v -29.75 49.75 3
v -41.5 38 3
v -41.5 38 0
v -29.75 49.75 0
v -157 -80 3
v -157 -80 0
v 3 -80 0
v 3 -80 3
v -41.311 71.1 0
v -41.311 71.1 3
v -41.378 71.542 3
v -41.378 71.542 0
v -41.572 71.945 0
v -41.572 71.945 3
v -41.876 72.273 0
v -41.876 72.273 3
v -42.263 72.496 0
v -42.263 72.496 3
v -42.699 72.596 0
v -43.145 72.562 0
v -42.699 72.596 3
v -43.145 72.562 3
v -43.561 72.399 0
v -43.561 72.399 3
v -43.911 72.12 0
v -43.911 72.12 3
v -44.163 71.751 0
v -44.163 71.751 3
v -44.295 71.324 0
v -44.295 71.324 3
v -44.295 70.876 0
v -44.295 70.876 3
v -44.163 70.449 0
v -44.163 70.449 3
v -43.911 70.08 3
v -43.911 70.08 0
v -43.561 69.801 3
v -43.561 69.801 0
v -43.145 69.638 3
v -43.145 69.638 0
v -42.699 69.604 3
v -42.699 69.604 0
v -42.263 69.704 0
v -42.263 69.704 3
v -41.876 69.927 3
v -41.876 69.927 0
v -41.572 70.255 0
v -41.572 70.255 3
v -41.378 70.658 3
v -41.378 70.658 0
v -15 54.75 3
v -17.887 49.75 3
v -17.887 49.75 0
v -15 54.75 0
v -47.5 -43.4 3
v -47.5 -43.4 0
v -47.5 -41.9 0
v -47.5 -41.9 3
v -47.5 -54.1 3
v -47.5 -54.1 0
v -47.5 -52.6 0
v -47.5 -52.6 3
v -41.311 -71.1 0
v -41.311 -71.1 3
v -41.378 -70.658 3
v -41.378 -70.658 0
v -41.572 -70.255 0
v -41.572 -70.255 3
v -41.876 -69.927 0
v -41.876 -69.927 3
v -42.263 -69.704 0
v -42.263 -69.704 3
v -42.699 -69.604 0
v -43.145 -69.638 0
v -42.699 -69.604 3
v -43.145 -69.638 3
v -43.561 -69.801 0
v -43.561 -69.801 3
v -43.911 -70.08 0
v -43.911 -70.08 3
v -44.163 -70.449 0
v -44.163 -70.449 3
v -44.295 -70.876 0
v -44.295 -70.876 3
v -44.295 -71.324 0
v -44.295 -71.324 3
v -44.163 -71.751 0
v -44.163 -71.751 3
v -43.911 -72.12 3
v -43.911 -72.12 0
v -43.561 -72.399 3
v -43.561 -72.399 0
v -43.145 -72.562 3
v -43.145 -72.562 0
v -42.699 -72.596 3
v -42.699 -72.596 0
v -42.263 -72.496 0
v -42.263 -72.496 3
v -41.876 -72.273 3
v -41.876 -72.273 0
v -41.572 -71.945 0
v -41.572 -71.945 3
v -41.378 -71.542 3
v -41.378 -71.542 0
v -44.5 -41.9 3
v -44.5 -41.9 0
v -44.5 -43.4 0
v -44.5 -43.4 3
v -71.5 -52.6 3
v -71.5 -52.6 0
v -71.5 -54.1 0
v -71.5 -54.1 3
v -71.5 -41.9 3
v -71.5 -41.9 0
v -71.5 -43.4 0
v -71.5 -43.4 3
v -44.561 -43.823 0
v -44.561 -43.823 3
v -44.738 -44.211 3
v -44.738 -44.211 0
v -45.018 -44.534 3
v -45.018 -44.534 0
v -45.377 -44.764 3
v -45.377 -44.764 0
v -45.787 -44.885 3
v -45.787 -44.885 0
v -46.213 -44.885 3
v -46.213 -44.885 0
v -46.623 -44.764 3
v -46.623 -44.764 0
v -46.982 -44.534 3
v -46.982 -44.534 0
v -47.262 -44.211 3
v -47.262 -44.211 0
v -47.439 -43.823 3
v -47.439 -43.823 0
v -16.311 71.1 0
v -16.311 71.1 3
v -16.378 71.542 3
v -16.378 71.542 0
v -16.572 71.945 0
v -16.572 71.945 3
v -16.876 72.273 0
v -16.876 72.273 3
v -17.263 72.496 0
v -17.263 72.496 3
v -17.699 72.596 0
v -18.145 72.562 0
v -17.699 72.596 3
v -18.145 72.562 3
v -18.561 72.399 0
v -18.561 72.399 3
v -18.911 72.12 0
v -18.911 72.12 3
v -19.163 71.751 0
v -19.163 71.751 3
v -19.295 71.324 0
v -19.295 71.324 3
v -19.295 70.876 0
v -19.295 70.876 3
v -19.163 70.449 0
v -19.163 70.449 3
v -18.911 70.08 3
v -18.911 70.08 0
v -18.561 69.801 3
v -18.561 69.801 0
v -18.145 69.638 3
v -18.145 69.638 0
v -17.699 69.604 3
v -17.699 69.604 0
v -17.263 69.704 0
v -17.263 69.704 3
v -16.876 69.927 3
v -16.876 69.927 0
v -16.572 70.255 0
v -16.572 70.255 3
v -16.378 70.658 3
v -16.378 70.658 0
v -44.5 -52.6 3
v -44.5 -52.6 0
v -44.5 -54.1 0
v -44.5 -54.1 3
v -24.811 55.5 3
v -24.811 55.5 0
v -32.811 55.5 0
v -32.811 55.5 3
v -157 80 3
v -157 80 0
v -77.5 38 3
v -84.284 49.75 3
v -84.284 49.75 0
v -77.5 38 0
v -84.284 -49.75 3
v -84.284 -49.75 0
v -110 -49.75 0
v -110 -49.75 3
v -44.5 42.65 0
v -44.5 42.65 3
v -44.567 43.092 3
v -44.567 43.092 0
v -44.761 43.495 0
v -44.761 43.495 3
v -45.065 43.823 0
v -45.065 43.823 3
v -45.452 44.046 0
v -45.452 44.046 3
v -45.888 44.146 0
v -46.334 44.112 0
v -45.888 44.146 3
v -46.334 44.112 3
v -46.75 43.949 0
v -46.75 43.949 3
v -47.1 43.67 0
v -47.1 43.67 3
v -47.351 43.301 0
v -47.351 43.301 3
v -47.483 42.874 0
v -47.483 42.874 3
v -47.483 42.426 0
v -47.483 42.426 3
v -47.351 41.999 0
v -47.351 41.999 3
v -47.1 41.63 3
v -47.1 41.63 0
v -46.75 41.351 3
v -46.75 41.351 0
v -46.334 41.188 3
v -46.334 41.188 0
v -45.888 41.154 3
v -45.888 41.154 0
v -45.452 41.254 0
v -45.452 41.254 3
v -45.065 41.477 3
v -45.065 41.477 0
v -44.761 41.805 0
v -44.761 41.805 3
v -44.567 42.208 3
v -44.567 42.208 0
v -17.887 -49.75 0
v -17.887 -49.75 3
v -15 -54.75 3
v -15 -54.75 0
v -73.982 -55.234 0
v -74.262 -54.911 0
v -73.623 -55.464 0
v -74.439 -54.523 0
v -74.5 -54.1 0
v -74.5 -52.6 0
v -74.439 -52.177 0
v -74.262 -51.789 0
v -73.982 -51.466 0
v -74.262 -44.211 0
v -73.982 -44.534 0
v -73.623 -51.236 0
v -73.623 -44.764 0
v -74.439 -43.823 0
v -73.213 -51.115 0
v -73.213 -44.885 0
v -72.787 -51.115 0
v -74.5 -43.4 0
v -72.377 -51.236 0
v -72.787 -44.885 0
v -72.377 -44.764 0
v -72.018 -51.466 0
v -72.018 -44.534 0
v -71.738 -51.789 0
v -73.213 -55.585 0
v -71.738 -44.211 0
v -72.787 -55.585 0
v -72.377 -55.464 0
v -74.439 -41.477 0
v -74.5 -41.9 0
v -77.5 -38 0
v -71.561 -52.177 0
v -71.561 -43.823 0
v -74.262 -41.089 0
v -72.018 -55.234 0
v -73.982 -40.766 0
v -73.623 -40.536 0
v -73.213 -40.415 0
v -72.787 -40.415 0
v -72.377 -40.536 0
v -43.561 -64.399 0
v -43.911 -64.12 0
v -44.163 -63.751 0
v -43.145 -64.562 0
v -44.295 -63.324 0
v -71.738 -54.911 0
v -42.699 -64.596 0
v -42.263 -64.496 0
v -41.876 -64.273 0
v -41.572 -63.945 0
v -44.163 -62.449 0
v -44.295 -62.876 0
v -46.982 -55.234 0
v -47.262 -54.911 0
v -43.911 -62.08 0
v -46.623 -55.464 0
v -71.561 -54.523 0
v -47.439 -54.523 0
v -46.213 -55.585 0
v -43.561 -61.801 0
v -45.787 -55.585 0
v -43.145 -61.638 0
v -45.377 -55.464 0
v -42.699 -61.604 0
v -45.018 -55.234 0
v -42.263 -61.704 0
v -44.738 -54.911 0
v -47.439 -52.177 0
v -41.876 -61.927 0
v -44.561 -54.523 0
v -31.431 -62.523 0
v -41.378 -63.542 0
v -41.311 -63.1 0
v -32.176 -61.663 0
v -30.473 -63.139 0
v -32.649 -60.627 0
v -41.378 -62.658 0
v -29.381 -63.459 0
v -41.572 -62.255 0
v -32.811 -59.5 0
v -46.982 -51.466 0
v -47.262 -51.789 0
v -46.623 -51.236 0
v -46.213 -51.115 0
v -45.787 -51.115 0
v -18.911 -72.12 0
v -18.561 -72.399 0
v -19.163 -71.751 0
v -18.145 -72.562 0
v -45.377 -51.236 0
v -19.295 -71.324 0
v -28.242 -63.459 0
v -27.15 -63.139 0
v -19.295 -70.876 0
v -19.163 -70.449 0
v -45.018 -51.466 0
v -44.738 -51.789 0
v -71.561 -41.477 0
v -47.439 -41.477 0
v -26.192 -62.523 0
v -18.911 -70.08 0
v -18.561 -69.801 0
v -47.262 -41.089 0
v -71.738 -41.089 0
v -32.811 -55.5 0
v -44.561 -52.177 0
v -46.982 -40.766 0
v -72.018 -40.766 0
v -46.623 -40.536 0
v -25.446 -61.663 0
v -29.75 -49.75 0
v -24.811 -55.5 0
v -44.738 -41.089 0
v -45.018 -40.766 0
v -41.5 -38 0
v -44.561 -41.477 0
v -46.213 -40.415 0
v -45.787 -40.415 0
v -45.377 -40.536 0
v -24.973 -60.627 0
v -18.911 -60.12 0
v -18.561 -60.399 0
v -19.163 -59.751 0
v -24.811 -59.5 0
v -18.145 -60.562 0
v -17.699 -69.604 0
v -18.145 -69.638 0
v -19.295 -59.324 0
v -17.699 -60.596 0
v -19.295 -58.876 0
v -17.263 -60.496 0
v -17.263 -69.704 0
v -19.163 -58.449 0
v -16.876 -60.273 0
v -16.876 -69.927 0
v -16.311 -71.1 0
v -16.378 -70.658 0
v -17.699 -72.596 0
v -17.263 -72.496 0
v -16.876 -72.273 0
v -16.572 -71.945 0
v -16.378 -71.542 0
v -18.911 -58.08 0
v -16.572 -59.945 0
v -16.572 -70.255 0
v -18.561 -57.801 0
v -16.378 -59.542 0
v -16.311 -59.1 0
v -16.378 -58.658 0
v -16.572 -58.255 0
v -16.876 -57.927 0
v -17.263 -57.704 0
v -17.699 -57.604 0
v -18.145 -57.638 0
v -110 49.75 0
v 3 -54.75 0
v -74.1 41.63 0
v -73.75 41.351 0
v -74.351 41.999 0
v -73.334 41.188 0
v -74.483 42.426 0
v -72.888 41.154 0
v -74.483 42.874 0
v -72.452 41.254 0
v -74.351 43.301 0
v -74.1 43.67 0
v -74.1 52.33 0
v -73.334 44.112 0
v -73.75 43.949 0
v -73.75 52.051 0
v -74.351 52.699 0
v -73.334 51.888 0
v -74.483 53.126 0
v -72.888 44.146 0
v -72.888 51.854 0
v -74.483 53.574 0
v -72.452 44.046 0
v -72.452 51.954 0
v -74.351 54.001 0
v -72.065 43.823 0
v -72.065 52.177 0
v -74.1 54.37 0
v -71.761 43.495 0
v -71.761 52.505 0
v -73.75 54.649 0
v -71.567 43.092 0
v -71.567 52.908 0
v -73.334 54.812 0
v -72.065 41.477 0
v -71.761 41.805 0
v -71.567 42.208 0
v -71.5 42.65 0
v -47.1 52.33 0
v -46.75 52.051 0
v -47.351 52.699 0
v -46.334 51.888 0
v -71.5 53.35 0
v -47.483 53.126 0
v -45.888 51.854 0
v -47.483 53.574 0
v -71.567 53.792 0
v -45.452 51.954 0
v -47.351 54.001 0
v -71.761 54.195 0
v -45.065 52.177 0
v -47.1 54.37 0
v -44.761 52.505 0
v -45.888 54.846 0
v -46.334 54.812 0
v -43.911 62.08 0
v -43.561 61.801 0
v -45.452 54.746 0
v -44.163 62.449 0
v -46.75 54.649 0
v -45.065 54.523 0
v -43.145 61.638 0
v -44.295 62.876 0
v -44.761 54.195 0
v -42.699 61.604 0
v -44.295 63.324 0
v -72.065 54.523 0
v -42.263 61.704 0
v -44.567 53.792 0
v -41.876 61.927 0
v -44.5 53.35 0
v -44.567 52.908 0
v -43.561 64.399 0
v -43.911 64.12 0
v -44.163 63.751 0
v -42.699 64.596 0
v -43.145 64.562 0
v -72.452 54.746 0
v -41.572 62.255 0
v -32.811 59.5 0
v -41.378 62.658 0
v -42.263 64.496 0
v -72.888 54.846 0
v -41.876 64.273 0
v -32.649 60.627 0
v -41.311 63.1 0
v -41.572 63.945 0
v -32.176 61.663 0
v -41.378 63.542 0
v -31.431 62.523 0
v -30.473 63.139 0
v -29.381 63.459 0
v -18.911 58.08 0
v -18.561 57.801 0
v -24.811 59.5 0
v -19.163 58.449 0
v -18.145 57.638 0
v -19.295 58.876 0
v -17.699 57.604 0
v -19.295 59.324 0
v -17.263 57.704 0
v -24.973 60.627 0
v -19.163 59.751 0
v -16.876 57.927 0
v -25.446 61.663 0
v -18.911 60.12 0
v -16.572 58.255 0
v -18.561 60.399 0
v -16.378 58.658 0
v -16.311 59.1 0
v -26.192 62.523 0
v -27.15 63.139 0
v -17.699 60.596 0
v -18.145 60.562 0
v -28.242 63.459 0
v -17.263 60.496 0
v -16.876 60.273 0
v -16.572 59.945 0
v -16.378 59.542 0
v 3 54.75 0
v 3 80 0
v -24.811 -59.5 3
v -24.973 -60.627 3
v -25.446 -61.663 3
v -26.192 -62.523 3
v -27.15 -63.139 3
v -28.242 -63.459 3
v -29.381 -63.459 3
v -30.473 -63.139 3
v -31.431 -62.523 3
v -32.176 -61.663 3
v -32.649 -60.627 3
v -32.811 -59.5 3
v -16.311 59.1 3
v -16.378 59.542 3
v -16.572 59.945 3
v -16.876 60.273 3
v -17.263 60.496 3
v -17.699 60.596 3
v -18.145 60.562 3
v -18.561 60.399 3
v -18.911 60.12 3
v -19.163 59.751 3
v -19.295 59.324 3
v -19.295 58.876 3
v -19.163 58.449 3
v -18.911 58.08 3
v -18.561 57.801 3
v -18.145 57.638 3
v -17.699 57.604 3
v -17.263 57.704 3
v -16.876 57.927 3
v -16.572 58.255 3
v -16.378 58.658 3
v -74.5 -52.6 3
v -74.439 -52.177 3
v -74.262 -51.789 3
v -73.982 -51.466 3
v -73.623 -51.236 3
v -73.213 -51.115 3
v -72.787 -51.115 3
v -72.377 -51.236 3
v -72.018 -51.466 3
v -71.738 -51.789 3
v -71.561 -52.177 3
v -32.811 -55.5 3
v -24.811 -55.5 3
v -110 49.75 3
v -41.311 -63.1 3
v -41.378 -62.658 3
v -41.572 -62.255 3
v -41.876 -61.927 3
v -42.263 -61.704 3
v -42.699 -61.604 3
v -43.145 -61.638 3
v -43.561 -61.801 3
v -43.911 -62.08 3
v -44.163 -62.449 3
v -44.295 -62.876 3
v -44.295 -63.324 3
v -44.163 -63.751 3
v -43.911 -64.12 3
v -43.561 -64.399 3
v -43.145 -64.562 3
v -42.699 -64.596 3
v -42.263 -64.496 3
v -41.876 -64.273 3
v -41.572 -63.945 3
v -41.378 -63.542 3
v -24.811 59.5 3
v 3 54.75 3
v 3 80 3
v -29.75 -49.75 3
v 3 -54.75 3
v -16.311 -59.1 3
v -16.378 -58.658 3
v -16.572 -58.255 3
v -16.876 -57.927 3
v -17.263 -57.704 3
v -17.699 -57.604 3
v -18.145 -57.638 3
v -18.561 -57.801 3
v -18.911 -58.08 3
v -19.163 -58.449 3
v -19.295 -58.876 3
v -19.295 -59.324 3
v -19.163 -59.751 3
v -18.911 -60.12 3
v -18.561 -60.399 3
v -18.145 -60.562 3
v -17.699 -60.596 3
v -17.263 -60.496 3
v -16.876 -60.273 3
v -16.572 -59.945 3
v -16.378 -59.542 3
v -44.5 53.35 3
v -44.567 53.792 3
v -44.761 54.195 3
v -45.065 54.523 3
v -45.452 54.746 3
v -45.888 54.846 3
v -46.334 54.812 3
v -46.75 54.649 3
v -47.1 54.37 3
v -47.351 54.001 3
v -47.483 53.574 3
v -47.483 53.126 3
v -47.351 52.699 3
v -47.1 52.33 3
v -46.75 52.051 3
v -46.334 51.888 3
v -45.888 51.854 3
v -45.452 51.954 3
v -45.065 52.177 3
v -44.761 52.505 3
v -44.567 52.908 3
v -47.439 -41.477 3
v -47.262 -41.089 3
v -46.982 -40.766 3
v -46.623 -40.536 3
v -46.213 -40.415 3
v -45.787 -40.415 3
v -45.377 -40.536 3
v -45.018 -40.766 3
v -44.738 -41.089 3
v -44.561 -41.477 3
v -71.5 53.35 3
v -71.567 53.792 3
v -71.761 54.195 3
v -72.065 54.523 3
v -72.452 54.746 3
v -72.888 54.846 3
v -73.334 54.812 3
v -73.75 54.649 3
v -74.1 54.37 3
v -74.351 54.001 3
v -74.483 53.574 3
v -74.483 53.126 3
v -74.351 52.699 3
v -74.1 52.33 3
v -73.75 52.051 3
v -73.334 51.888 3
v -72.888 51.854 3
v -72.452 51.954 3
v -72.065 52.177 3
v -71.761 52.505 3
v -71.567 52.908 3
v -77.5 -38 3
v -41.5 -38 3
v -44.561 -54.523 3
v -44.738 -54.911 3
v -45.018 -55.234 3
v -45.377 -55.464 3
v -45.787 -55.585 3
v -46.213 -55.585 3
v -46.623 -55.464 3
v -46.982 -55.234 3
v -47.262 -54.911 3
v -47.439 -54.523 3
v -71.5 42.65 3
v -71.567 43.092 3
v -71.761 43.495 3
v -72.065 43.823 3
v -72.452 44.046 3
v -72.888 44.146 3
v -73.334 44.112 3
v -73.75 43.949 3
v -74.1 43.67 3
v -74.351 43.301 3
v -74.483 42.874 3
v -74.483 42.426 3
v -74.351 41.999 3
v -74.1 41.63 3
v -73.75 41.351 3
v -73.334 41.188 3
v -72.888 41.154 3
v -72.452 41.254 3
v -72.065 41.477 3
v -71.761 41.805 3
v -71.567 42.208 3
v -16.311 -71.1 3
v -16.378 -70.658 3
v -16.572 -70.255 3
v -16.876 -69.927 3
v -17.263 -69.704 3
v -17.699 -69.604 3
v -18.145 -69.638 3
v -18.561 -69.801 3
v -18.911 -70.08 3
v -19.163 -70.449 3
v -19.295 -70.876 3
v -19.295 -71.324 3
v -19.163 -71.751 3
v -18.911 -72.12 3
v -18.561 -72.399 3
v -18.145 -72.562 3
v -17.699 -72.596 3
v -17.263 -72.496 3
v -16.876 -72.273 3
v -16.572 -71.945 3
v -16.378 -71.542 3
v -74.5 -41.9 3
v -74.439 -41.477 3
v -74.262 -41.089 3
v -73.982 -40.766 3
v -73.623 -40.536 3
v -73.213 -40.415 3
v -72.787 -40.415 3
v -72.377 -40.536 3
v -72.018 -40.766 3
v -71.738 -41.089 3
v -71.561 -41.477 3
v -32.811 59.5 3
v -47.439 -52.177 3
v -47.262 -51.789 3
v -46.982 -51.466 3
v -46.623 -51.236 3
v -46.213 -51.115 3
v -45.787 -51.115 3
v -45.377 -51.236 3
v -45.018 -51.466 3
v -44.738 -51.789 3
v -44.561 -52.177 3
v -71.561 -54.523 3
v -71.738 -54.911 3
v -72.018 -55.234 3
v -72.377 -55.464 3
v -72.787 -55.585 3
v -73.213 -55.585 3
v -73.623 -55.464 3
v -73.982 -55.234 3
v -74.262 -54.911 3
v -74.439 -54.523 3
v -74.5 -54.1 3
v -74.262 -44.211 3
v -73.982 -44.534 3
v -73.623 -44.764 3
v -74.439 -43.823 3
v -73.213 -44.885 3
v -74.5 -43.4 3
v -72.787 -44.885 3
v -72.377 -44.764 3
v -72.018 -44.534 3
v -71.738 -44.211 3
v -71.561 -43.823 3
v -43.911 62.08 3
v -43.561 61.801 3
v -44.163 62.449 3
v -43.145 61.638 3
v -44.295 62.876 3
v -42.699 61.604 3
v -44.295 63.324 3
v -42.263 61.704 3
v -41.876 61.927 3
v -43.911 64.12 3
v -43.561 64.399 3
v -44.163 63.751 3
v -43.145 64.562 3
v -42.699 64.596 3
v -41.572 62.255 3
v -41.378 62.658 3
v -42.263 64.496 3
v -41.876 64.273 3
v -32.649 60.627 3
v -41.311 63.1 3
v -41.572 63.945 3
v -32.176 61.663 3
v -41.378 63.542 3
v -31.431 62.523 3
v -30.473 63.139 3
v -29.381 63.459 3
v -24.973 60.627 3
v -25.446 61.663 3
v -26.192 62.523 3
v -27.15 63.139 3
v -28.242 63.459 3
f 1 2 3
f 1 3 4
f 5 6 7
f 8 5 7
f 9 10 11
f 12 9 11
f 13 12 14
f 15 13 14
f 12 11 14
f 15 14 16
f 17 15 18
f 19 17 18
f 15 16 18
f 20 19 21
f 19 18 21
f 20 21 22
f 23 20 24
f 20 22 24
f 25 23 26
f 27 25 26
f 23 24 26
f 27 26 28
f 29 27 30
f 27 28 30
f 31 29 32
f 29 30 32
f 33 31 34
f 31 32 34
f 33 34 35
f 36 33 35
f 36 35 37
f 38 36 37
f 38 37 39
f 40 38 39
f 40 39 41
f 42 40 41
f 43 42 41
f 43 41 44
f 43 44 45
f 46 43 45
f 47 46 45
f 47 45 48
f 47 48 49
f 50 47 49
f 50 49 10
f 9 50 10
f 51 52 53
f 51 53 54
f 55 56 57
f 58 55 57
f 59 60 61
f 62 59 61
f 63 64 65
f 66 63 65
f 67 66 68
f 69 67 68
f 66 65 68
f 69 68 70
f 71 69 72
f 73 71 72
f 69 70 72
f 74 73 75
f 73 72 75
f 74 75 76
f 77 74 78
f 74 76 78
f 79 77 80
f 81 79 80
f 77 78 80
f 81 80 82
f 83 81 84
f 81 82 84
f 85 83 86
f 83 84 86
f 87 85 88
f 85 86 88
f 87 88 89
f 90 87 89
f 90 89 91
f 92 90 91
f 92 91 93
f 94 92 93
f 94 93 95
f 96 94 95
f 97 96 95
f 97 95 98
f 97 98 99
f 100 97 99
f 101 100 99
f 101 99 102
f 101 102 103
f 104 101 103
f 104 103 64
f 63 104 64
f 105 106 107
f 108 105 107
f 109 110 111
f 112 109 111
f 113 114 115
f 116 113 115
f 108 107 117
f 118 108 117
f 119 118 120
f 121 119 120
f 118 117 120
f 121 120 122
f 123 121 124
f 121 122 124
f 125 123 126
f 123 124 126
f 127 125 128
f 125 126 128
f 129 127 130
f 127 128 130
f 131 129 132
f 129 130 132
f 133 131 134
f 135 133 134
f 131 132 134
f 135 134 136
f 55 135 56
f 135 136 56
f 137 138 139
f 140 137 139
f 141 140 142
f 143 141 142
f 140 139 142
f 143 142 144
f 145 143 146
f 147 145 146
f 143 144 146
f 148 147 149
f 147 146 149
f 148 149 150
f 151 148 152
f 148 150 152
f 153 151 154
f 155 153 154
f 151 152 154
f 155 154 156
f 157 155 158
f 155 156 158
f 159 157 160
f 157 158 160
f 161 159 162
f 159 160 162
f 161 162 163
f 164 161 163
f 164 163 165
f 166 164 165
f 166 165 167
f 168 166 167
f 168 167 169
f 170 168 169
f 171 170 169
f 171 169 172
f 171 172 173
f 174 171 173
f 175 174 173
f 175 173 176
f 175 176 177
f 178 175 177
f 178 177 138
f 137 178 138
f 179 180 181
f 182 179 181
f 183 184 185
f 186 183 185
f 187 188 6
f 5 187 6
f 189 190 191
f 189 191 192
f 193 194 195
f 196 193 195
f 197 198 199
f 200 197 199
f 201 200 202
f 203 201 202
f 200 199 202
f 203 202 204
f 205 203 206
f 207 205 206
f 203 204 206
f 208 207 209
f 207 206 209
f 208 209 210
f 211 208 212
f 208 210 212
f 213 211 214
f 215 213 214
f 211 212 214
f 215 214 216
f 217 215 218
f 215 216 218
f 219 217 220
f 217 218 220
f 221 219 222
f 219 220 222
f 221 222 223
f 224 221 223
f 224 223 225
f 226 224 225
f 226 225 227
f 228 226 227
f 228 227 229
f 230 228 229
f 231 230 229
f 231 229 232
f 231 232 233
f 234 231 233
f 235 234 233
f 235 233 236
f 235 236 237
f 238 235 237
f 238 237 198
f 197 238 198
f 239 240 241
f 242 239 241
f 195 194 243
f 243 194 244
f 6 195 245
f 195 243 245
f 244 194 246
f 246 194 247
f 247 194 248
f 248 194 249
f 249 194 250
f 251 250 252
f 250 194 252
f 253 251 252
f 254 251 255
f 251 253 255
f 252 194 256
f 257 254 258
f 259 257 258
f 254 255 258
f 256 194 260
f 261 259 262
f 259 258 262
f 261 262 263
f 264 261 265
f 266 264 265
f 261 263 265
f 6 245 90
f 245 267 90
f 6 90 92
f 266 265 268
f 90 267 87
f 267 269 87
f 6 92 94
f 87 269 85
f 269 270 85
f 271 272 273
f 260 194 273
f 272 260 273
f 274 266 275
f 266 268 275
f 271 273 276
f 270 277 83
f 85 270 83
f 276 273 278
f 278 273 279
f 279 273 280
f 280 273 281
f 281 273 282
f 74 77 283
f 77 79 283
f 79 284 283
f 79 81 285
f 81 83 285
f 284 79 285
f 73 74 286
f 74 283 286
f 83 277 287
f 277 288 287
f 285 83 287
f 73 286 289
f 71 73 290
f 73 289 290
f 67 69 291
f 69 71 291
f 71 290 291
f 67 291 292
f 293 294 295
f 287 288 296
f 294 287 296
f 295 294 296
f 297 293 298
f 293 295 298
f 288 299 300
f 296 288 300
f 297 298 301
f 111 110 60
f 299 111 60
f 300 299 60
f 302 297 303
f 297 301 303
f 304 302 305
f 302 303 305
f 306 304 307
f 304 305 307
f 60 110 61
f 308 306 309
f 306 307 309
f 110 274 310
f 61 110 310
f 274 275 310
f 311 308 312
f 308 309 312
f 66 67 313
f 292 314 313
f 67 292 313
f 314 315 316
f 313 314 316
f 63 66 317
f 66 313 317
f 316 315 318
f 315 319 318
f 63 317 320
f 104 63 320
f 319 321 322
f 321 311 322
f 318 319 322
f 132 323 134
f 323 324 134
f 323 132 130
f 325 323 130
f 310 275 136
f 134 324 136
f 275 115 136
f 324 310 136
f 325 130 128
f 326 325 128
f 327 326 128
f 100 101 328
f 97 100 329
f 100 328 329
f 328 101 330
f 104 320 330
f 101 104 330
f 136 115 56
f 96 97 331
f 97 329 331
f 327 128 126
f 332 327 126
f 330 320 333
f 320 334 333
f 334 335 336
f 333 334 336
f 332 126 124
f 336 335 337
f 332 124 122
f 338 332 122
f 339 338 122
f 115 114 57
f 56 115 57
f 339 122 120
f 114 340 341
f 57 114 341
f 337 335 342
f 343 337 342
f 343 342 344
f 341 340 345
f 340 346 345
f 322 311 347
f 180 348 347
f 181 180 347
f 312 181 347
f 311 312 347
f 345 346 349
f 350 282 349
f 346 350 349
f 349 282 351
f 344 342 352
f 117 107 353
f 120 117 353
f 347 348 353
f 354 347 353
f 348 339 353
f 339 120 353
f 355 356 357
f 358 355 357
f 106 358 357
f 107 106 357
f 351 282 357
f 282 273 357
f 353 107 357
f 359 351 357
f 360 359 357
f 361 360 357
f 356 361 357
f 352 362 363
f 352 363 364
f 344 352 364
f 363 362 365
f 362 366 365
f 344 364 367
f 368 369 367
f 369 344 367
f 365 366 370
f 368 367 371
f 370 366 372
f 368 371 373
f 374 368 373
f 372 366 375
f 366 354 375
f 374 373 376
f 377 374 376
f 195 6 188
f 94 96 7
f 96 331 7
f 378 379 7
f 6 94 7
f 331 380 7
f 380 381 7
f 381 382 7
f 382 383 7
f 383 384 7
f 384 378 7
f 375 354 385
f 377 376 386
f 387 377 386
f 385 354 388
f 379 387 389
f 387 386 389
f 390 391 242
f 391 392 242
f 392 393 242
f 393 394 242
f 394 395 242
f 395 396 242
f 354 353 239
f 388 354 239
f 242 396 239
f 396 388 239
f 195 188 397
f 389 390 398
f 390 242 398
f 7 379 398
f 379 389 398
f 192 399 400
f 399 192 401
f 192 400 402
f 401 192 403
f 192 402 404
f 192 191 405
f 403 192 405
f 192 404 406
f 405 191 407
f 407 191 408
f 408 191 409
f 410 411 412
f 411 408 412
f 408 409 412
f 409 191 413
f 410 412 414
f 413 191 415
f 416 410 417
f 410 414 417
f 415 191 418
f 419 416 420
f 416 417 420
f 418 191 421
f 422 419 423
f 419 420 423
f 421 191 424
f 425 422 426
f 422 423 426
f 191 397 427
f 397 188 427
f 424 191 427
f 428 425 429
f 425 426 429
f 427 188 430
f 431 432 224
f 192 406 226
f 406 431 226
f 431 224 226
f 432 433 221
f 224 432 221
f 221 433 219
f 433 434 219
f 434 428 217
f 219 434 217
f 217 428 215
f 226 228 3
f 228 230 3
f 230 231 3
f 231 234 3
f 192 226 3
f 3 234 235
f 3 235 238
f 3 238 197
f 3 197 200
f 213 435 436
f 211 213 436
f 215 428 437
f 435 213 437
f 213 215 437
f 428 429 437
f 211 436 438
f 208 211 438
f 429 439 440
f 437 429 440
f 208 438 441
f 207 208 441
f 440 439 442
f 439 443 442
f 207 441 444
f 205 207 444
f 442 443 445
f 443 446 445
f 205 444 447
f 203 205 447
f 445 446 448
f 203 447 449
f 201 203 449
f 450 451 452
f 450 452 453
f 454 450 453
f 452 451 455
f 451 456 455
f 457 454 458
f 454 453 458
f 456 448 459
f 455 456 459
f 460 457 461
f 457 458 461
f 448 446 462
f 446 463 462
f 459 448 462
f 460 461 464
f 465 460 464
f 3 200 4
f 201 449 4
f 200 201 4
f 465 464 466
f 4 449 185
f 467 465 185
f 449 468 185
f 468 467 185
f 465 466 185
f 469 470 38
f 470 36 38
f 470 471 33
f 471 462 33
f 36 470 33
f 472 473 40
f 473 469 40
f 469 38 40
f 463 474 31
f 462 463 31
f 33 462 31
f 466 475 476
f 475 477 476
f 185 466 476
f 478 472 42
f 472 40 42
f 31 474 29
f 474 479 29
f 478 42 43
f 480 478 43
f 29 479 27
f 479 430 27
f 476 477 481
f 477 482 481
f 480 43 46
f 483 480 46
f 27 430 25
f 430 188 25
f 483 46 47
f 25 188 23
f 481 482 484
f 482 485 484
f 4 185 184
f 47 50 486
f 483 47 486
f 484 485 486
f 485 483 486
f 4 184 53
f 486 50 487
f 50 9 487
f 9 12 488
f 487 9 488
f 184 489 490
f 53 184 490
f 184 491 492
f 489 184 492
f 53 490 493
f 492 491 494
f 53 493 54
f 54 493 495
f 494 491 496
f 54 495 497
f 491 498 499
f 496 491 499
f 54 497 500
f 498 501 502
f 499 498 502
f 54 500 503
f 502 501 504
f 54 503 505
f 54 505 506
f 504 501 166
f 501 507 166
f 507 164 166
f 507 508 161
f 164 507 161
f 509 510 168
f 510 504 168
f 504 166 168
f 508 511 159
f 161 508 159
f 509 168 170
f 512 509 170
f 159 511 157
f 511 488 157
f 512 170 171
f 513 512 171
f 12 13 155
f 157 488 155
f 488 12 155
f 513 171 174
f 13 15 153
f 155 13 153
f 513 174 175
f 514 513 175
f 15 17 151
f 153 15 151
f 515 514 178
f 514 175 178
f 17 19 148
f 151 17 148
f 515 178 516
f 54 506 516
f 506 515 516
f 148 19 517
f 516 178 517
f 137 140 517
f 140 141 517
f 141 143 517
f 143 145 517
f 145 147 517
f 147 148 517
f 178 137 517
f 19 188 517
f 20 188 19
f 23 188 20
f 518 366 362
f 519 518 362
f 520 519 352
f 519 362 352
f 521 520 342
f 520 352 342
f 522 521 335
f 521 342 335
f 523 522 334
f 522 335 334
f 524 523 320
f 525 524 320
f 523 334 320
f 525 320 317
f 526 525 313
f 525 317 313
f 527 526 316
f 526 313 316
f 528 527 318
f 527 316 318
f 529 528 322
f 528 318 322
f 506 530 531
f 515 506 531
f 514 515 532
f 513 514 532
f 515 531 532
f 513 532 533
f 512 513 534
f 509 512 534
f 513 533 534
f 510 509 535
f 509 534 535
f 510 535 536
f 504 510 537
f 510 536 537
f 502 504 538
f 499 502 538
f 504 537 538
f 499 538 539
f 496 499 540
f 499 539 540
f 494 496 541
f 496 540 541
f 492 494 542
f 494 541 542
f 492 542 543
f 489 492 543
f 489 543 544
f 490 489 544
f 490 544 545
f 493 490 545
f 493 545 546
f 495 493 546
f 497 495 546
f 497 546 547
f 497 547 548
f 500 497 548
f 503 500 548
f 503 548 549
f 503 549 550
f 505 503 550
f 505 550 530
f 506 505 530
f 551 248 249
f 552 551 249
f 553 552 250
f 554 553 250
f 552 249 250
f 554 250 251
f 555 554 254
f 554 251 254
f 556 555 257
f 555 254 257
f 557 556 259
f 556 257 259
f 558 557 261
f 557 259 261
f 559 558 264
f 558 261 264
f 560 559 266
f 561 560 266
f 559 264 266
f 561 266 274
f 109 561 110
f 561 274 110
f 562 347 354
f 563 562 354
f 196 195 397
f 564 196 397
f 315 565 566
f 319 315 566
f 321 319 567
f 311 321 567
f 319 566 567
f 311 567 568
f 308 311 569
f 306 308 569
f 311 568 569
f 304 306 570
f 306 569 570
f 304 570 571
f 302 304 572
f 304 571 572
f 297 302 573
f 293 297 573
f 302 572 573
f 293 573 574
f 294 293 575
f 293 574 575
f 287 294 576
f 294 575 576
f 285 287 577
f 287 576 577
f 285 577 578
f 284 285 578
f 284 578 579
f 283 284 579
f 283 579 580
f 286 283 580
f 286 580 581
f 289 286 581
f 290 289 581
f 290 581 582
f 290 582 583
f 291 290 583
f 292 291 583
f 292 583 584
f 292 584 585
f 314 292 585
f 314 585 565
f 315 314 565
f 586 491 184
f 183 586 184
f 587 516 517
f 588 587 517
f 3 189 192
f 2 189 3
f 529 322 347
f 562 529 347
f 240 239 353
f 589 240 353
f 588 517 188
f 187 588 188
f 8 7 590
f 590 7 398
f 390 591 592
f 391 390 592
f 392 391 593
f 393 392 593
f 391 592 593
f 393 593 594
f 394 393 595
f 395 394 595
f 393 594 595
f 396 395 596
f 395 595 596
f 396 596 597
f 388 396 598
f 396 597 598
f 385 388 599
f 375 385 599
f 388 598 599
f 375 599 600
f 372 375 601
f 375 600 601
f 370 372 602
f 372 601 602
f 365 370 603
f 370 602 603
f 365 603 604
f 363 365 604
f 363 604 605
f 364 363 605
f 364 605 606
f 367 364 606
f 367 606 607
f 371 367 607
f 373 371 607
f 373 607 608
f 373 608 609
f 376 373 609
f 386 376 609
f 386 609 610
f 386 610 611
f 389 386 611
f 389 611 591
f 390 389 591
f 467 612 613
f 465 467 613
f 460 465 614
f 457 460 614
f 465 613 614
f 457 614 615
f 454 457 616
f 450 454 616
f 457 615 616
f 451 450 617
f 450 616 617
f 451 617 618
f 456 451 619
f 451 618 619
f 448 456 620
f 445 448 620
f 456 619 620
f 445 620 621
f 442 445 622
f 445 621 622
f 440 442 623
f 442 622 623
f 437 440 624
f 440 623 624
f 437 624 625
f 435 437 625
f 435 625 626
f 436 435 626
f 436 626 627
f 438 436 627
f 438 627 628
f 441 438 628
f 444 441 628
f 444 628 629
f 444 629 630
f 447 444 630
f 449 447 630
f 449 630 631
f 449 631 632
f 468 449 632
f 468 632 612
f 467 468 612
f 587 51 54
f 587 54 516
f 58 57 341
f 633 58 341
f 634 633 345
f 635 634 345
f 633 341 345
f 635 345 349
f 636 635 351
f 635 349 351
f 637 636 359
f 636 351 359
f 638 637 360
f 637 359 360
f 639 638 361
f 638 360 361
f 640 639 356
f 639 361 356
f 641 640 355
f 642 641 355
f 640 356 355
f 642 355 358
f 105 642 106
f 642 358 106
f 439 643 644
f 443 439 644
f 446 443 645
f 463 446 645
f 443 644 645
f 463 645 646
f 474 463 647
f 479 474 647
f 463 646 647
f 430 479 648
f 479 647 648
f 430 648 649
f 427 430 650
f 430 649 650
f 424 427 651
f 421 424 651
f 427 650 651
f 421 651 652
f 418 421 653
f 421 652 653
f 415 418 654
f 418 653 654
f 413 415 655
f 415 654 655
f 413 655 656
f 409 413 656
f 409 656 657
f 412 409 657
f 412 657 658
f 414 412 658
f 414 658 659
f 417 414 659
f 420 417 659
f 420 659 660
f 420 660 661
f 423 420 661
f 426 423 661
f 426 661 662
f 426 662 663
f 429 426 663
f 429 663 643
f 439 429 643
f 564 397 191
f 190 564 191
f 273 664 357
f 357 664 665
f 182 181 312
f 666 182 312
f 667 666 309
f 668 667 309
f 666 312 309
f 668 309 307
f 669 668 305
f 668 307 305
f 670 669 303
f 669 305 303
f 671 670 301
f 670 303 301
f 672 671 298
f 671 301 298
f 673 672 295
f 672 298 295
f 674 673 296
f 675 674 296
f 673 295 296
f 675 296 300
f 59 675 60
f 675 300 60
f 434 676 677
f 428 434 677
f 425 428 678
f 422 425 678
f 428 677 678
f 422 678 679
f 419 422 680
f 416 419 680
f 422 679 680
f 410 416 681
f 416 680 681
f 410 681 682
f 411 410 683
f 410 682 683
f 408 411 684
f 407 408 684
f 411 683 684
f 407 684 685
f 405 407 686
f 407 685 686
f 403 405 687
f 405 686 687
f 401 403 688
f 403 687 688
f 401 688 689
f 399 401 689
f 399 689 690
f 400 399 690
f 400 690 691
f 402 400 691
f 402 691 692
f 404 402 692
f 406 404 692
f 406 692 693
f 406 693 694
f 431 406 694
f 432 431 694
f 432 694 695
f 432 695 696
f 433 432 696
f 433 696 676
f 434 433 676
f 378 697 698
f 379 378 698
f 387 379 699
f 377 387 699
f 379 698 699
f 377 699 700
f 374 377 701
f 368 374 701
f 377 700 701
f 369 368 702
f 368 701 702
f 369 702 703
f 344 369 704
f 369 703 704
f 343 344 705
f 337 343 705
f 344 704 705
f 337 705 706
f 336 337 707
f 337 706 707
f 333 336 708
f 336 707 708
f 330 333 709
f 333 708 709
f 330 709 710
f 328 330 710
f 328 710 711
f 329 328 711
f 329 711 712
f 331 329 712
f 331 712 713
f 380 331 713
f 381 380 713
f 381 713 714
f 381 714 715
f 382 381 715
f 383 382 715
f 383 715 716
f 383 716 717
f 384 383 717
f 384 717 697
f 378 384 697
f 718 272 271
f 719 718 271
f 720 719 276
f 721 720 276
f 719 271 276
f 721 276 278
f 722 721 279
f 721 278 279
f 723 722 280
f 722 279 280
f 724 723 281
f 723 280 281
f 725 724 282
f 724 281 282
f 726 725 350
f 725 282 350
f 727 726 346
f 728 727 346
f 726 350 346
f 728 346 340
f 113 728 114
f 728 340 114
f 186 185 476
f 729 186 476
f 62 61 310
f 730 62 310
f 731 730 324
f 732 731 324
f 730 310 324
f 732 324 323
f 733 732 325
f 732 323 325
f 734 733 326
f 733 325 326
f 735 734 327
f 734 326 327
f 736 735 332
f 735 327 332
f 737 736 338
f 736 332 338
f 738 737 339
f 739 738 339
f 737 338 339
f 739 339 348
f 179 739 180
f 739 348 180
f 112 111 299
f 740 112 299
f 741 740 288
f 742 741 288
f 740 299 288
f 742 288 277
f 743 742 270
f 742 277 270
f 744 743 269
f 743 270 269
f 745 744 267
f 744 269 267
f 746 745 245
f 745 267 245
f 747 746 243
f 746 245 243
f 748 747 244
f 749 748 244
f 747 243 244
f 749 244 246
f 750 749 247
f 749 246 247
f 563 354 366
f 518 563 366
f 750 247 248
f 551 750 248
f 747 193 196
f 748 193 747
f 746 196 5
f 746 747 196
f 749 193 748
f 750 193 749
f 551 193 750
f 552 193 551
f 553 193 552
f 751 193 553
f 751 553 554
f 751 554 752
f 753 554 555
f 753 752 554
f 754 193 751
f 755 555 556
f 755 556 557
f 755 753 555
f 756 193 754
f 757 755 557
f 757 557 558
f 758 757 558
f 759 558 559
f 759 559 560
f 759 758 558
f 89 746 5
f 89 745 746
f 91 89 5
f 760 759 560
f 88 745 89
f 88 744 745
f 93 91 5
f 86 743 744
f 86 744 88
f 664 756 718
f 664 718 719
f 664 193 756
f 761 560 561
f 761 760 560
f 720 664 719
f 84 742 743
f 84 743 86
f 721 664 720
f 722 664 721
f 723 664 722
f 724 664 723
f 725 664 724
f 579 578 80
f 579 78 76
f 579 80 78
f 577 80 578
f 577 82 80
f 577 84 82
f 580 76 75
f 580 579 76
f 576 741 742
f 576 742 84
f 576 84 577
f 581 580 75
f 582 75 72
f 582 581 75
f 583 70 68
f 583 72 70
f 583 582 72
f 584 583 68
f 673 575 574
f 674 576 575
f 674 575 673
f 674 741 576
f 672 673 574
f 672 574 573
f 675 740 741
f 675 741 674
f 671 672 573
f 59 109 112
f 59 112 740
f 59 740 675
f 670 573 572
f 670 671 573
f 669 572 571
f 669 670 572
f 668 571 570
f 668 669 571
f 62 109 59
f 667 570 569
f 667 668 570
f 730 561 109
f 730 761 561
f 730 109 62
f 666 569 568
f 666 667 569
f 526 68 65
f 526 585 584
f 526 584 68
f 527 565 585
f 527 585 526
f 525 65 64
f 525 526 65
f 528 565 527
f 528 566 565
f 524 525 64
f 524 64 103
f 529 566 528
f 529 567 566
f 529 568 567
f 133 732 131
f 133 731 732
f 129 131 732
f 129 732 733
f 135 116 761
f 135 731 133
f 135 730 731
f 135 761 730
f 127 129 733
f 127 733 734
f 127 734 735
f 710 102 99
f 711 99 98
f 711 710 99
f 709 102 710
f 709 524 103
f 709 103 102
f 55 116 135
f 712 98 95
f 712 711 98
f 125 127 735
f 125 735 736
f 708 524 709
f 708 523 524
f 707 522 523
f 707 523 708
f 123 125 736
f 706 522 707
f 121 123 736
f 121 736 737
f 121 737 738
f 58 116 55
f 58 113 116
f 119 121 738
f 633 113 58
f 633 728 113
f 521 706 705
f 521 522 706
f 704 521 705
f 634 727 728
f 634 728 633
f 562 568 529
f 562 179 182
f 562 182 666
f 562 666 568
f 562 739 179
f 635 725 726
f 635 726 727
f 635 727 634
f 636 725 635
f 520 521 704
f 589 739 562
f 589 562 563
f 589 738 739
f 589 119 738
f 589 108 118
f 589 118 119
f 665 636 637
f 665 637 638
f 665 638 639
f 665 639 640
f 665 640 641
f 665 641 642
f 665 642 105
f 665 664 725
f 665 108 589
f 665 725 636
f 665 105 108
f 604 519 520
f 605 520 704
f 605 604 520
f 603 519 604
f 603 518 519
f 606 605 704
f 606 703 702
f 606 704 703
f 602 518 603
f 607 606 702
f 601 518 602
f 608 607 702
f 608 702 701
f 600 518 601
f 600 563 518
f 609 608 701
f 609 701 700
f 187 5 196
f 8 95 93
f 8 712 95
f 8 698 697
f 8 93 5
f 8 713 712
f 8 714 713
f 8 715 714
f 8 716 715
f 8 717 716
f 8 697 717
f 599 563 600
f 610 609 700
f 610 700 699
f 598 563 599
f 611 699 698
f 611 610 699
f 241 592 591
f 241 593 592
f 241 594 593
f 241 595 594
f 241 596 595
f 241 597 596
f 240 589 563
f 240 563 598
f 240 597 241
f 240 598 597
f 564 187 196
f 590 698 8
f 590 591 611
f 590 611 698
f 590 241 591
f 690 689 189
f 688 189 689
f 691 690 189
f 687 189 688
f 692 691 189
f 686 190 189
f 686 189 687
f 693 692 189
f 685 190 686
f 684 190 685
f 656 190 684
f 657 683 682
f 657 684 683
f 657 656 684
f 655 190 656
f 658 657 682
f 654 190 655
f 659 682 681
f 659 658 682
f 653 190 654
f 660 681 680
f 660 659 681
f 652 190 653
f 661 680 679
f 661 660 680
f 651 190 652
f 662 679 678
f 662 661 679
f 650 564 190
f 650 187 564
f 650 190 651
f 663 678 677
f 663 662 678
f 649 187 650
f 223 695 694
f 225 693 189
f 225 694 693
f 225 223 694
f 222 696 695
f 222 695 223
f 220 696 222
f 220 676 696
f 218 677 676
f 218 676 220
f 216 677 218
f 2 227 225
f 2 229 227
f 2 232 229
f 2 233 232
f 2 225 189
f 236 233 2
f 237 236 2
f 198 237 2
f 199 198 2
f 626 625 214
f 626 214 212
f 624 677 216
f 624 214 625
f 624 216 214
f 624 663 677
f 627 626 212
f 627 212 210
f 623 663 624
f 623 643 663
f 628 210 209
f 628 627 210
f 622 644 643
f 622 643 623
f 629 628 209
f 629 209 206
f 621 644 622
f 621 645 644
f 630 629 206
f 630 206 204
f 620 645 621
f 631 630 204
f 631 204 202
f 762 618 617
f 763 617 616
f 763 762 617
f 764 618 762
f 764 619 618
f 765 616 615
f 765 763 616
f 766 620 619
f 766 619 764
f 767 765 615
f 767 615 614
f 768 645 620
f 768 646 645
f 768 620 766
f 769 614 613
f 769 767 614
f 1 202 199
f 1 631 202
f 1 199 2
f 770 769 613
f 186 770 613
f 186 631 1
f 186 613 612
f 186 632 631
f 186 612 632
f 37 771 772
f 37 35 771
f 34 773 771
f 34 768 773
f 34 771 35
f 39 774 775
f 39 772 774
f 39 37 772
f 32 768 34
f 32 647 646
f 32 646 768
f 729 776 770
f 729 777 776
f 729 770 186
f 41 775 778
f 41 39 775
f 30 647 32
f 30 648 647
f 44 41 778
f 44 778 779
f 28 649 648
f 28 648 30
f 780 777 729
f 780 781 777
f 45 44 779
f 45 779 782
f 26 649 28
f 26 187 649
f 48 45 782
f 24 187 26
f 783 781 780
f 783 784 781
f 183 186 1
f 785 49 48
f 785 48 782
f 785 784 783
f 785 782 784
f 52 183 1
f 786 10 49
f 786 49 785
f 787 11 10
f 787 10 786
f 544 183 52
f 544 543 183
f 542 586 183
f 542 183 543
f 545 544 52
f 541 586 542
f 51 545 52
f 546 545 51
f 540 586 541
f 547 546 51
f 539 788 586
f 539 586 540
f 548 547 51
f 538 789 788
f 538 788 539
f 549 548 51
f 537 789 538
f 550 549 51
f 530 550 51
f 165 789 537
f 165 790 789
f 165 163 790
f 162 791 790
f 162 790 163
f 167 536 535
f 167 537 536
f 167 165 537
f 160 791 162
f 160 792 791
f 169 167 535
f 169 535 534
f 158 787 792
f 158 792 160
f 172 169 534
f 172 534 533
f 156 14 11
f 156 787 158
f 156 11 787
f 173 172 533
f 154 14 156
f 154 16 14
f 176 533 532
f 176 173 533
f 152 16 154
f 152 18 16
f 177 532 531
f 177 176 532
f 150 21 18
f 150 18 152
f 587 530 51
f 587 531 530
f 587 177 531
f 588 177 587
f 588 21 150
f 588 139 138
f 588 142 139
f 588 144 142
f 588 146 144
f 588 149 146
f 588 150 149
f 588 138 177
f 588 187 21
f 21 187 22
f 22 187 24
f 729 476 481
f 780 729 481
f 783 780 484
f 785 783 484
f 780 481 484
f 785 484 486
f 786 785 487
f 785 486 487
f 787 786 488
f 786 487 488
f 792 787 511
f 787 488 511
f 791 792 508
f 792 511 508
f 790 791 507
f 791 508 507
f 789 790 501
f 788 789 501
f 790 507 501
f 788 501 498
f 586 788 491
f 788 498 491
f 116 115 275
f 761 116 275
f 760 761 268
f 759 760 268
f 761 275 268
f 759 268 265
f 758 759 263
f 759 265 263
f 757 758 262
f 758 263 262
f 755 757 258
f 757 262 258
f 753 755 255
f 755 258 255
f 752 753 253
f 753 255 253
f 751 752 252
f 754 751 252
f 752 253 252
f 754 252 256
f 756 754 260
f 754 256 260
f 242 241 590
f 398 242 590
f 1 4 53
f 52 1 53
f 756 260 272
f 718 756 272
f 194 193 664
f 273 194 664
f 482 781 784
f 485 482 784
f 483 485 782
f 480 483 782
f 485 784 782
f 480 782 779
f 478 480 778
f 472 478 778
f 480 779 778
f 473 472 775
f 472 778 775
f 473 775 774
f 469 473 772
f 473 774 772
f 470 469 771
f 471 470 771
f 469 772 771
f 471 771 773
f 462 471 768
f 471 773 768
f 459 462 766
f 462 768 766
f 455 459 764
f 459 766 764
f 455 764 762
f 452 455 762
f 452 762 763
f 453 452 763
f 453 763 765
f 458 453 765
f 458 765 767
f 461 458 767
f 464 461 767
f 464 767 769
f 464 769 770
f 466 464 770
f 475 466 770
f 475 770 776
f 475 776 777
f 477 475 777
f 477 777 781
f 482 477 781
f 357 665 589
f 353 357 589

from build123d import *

# Parameters (mm, degrees)
BOSS_EXTRUDE1_DEPTH = 3
BOSS_EXTRUDE2_DEPTH = 3
CUT_EXTRUDE1_DEPTH  = 4
SKETCH5_R           = 1.5
CUT_EXTRUDE2_DEPTH  = 10
SKETCH7_R           = 4
CUT_EXTRUDE3_DEPTH  = 6
SKETCH8_R           = 1.5
CUT_EXTRUDE4_DEPTH  = 4
CUT_EXTRUDE5_DEPTH  = 10
CUT_EXTRUDE6_DEPTH  = 4


with BuildPart() as part:
    # Sketch2 → Boss-Extrude1 (new body)
    with BuildSketch(Plane.XY):
        Polygon((-110, 49.75), (3, 49.75), (3, 80), (-157, 80), (-157, -80), (3, -80), (3, -49.75), (-110, -49.75), align=None)
    extrude(amount=BOSS_EXTRUDE1_DEPTH)

    # Sketch3 → Boss-Extrude2 (add)
    with BuildSketch(Plane.XY.offset(3)):
        Polygon((-77.5, 38), (-41.5, 38), (-29.75, 49.75), (-84.283865663, 49.75), align=None)
        Polygon((-29.75, -49.75), (-84.283865663, -49.75), (-77.5, -38), (-41.5, -38), align=None)
    extrude(amount=-BOSS_EXTRUDE2_DEPTH)

    # Sketch4 → Cut-Extrude1 (cut, through all)
    with BuildSketch(Plane.XY.offset(3)):
        Polygon((-17.886751346, -49.75), (-15, -54.75), (3, -54.75), (3, -49.75), align=None)
        Polygon((-17.886751346, 49.75), (-15, 54.75), (3, 54.75), (3, 49.75), align=None)
    extrude(amount=-CUT_EXTRUDE1_DEPTH, mode=Mode.SUBTRACT)

    # Sketch5 → Cut-Extrude2 (cut)
    with BuildSketch(Plane.XY.offset(3)):
        with Locations((-73, -42.65)):
            Circle(SKETCH5_R)
        with Locations((-46, -42.65)):
            Circle(SKETCH5_R)
        with Locations((-46, -53.35)):
            Circle(SKETCH5_R)
        with Locations((-73, -53.35)):
            Circle(SKETCH5_R)
        with Locations((-46, 42.65)):
            Circle(SKETCH5_R)
        with Locations((-73, 42.65)):
            Circle(SKETCH5_R)
        with Locations((-73, 53.35)):
            Circle(SKETCH5_R)
        with Locations((-46, 53.35)):
            Circle(SKETCH5_R)
    extrude(amount=-CUT_EXTRUDE2_DEPTH, mode=Mode.SUBTRACT)

    # Sketch7 → Cut-Extrude3 (cut)
    with BuildSketch(Plane(origin=(0, 0, 0), x_dir=(-1, 0, 0), z_dir=(0, 0, -1))):
        with Locations((28.811352149, -59.5)):
            Circle(SKETCH7_R)
        with Locations((28.811352149, 59.5)):
            Circle(SKETCH7_R)
    extrude(amount=-CUT_EXTRUDE3_DEPTH, mode=Mode.SUBTRACT)

    # Sketch8 → Cut-Extrude4 (cut)
    with BuildSketch(Plane.XY.offset(3)):
        with Locations((-17.811352149, 59.1)):
            Circle(SKETCH8_R)
        with Locations((-17.811352149, 71.1)):
            Circle(SKETCH8_R)
        with Locations((-42.811352149, 63.1)):
            Circle(SKETCH8_R)
        with Locations((-42.811352149, 71.1)):
            Circle(SKETCH8_R)
        with Locations((-42.811352149, -71.1)):
            Circle(SKETCH8_R)
        with Locations((-42.811352149, -63.1)):
            Circle(SKETCH8_R)
        with Locations((-17.811352149, -59.1)):
            Circle(SKETCH8_R)
        with Locations((-17.811352149, -71.1)):
            Circle(SKETCH8_R)
    extrude(amount=-CUT_EXTRUDE4_DEPTH, mode=Mode.SUBTRACT)

    # Sketch9 → Cut-Extrude5 (cut)
    with BuildSketch(Plane(origin=(0, 0, 0), x_dir=(-1, 0, 0), z_dir=(0, 0, -1))):
        with BuildLine():
            Line((32.811352149, -55.5), (28.811352149, -55.5))
            ThreePointArc((28.811352149, -55.5), (31.639779274, -56.671572875), (32.811352149, -59.5))
            Line((32.811352149, -59.5), (32.811352149, -55.5))
        make_face()
        with BuildLine():
            Line((24.811352149, -55.5), (24.811352149, -59.5))
            ThreePointArc((24.811352149, -59.5), (25.982925025, -56.671572875), (28.811352149, -55.5))
            Line((28.811352149, -55.5), (24.811352149, -55.5))
        make_face()
        with BuildLine():
            ThreePointArc((28.811352149, 55.5), (25.982925025, 56.671572875), (24.811352149, 59.5))
            Line((24.811352149, 59.5), (24.811352149, 55.5))
            Line((24.811352149, 55.5), (28.811352149, 55.5))
        make_face()
        with BuildLine():
            Line((32.811352149, 55.5), (32.811352149, 59.5))
            ThreePointArc((32.811352149, 59.5), (31.639779274, 56.671572875), (28.811352149, 55.5))
            Line((28.811352149, 55.5), (32.811352149, 55.5))
        make_face()
    extrude(amount=-CUT_EXTRUDE5_DEPTH, mode=Mode.SUBTRACT)

    # Sketch10 → Cut-Extrude6 (cut, through all)
    with BuildSketch(Plane(origin=(0, 0, 0), x_dir=(-1, 0, 0), z_dir=(0, 0, -1))):
        with BuildLine():
            Line((71.5, -52.6), (71.5, -53.35))
            ThreePointArc((71.5, -53.35), (73, -51.85), (74.5, -53.35))
            Line((74.5, -53.35), (74.5, -52.6))
            ThreePointArc((74.5, -52.6), (73, -51.1), (71.5, -52.6))
        make_face()
        with BuildLine():
            Line((71.5, -53.35), (71.5, -54.1))
            ThreePointArc((71.5, -54.1), (73, -55.6), (74.5, -54.1))
            Line((74.5, -54.1), (74.5, -53.35))
            ThreePointArc((74.5, -53.35), (73, -54.85), (71.5, -53.35))
        make_face()
        with BuildLine():
            Line((74.5, -43.4), (74.5, -42.65))
            ThreePointArc((74.5, -42.65), (73, -44.15), (71.5, -42.65))
            Line((71.5, -42.65), (71.5, -43.4))
            ThreePointArc((71.5, -43.4), (73, -44.9), (74.5, -43.4))
        make_face()
        with BuildLine():
            Line((74.5, -42.65), (74.5, -41.9))
            ThreePointArc((74.5, -41.9), (73, -40.4), (71.5, -41.9))
            Line((71.5, -41.9), (71.5, -42.65))
            ThreePointArc((71.5, -42.65), (73, -41.15), (74.5, -42.65))
        make_face()
        with BuildLine():
            Line((47.5, -42.65), (47.5, -41.9))
            ThreePointArc((47.5, -41.9), (46, -40.4), (44.5, -41.9))
            Line((44.5, -41.9), (44.5, -42.65))
            ThreePointArc((44.5, -42.65), (46, -41.15), (47.5, -42.65))
        make_face()
        with BuildLine():
            Line((47.5, -43.4), (47.5, -42.65))
            ThreePointArc((47.5, -42.65), (46, -44.15), (44.5, -42.65))
            Line((44.5, -42.65), (44.5, -43.4))
            ThreePointArc((44.5, -43.4), (46, -44.9), (47.5, -43.4))
        make_face()
        with BuildLine():
            Line((44.5, -52.6), (44.5, -53.35))
            ThreePointArc((44.5, -53.35), (46, -51.85), (47.5, -53.35))
            Line((47.5, -53.35), (47.5, -52.6))
            ThreePointArc((47.5, -52.6), (46, -51.1), (44.5, -52.6))
        make_face()
        with BuildLine():
            Line((44.5, -53.35), (44.5, -54.1))
            ThreePointArc((44.5, -54.1), (46, -55.6), (47.5, -54.1))
            Line((47.5, -54.1), (47.5, -53.35))
            ThreePointArc((47.5, -53.35), (46, -54.85), (44.5, -53.35))
        make_face()
    extrude(amount=-CUT_EXTRUDE6_DEPTH, mode=Mode.SUBTRACT)


solid = part.part
